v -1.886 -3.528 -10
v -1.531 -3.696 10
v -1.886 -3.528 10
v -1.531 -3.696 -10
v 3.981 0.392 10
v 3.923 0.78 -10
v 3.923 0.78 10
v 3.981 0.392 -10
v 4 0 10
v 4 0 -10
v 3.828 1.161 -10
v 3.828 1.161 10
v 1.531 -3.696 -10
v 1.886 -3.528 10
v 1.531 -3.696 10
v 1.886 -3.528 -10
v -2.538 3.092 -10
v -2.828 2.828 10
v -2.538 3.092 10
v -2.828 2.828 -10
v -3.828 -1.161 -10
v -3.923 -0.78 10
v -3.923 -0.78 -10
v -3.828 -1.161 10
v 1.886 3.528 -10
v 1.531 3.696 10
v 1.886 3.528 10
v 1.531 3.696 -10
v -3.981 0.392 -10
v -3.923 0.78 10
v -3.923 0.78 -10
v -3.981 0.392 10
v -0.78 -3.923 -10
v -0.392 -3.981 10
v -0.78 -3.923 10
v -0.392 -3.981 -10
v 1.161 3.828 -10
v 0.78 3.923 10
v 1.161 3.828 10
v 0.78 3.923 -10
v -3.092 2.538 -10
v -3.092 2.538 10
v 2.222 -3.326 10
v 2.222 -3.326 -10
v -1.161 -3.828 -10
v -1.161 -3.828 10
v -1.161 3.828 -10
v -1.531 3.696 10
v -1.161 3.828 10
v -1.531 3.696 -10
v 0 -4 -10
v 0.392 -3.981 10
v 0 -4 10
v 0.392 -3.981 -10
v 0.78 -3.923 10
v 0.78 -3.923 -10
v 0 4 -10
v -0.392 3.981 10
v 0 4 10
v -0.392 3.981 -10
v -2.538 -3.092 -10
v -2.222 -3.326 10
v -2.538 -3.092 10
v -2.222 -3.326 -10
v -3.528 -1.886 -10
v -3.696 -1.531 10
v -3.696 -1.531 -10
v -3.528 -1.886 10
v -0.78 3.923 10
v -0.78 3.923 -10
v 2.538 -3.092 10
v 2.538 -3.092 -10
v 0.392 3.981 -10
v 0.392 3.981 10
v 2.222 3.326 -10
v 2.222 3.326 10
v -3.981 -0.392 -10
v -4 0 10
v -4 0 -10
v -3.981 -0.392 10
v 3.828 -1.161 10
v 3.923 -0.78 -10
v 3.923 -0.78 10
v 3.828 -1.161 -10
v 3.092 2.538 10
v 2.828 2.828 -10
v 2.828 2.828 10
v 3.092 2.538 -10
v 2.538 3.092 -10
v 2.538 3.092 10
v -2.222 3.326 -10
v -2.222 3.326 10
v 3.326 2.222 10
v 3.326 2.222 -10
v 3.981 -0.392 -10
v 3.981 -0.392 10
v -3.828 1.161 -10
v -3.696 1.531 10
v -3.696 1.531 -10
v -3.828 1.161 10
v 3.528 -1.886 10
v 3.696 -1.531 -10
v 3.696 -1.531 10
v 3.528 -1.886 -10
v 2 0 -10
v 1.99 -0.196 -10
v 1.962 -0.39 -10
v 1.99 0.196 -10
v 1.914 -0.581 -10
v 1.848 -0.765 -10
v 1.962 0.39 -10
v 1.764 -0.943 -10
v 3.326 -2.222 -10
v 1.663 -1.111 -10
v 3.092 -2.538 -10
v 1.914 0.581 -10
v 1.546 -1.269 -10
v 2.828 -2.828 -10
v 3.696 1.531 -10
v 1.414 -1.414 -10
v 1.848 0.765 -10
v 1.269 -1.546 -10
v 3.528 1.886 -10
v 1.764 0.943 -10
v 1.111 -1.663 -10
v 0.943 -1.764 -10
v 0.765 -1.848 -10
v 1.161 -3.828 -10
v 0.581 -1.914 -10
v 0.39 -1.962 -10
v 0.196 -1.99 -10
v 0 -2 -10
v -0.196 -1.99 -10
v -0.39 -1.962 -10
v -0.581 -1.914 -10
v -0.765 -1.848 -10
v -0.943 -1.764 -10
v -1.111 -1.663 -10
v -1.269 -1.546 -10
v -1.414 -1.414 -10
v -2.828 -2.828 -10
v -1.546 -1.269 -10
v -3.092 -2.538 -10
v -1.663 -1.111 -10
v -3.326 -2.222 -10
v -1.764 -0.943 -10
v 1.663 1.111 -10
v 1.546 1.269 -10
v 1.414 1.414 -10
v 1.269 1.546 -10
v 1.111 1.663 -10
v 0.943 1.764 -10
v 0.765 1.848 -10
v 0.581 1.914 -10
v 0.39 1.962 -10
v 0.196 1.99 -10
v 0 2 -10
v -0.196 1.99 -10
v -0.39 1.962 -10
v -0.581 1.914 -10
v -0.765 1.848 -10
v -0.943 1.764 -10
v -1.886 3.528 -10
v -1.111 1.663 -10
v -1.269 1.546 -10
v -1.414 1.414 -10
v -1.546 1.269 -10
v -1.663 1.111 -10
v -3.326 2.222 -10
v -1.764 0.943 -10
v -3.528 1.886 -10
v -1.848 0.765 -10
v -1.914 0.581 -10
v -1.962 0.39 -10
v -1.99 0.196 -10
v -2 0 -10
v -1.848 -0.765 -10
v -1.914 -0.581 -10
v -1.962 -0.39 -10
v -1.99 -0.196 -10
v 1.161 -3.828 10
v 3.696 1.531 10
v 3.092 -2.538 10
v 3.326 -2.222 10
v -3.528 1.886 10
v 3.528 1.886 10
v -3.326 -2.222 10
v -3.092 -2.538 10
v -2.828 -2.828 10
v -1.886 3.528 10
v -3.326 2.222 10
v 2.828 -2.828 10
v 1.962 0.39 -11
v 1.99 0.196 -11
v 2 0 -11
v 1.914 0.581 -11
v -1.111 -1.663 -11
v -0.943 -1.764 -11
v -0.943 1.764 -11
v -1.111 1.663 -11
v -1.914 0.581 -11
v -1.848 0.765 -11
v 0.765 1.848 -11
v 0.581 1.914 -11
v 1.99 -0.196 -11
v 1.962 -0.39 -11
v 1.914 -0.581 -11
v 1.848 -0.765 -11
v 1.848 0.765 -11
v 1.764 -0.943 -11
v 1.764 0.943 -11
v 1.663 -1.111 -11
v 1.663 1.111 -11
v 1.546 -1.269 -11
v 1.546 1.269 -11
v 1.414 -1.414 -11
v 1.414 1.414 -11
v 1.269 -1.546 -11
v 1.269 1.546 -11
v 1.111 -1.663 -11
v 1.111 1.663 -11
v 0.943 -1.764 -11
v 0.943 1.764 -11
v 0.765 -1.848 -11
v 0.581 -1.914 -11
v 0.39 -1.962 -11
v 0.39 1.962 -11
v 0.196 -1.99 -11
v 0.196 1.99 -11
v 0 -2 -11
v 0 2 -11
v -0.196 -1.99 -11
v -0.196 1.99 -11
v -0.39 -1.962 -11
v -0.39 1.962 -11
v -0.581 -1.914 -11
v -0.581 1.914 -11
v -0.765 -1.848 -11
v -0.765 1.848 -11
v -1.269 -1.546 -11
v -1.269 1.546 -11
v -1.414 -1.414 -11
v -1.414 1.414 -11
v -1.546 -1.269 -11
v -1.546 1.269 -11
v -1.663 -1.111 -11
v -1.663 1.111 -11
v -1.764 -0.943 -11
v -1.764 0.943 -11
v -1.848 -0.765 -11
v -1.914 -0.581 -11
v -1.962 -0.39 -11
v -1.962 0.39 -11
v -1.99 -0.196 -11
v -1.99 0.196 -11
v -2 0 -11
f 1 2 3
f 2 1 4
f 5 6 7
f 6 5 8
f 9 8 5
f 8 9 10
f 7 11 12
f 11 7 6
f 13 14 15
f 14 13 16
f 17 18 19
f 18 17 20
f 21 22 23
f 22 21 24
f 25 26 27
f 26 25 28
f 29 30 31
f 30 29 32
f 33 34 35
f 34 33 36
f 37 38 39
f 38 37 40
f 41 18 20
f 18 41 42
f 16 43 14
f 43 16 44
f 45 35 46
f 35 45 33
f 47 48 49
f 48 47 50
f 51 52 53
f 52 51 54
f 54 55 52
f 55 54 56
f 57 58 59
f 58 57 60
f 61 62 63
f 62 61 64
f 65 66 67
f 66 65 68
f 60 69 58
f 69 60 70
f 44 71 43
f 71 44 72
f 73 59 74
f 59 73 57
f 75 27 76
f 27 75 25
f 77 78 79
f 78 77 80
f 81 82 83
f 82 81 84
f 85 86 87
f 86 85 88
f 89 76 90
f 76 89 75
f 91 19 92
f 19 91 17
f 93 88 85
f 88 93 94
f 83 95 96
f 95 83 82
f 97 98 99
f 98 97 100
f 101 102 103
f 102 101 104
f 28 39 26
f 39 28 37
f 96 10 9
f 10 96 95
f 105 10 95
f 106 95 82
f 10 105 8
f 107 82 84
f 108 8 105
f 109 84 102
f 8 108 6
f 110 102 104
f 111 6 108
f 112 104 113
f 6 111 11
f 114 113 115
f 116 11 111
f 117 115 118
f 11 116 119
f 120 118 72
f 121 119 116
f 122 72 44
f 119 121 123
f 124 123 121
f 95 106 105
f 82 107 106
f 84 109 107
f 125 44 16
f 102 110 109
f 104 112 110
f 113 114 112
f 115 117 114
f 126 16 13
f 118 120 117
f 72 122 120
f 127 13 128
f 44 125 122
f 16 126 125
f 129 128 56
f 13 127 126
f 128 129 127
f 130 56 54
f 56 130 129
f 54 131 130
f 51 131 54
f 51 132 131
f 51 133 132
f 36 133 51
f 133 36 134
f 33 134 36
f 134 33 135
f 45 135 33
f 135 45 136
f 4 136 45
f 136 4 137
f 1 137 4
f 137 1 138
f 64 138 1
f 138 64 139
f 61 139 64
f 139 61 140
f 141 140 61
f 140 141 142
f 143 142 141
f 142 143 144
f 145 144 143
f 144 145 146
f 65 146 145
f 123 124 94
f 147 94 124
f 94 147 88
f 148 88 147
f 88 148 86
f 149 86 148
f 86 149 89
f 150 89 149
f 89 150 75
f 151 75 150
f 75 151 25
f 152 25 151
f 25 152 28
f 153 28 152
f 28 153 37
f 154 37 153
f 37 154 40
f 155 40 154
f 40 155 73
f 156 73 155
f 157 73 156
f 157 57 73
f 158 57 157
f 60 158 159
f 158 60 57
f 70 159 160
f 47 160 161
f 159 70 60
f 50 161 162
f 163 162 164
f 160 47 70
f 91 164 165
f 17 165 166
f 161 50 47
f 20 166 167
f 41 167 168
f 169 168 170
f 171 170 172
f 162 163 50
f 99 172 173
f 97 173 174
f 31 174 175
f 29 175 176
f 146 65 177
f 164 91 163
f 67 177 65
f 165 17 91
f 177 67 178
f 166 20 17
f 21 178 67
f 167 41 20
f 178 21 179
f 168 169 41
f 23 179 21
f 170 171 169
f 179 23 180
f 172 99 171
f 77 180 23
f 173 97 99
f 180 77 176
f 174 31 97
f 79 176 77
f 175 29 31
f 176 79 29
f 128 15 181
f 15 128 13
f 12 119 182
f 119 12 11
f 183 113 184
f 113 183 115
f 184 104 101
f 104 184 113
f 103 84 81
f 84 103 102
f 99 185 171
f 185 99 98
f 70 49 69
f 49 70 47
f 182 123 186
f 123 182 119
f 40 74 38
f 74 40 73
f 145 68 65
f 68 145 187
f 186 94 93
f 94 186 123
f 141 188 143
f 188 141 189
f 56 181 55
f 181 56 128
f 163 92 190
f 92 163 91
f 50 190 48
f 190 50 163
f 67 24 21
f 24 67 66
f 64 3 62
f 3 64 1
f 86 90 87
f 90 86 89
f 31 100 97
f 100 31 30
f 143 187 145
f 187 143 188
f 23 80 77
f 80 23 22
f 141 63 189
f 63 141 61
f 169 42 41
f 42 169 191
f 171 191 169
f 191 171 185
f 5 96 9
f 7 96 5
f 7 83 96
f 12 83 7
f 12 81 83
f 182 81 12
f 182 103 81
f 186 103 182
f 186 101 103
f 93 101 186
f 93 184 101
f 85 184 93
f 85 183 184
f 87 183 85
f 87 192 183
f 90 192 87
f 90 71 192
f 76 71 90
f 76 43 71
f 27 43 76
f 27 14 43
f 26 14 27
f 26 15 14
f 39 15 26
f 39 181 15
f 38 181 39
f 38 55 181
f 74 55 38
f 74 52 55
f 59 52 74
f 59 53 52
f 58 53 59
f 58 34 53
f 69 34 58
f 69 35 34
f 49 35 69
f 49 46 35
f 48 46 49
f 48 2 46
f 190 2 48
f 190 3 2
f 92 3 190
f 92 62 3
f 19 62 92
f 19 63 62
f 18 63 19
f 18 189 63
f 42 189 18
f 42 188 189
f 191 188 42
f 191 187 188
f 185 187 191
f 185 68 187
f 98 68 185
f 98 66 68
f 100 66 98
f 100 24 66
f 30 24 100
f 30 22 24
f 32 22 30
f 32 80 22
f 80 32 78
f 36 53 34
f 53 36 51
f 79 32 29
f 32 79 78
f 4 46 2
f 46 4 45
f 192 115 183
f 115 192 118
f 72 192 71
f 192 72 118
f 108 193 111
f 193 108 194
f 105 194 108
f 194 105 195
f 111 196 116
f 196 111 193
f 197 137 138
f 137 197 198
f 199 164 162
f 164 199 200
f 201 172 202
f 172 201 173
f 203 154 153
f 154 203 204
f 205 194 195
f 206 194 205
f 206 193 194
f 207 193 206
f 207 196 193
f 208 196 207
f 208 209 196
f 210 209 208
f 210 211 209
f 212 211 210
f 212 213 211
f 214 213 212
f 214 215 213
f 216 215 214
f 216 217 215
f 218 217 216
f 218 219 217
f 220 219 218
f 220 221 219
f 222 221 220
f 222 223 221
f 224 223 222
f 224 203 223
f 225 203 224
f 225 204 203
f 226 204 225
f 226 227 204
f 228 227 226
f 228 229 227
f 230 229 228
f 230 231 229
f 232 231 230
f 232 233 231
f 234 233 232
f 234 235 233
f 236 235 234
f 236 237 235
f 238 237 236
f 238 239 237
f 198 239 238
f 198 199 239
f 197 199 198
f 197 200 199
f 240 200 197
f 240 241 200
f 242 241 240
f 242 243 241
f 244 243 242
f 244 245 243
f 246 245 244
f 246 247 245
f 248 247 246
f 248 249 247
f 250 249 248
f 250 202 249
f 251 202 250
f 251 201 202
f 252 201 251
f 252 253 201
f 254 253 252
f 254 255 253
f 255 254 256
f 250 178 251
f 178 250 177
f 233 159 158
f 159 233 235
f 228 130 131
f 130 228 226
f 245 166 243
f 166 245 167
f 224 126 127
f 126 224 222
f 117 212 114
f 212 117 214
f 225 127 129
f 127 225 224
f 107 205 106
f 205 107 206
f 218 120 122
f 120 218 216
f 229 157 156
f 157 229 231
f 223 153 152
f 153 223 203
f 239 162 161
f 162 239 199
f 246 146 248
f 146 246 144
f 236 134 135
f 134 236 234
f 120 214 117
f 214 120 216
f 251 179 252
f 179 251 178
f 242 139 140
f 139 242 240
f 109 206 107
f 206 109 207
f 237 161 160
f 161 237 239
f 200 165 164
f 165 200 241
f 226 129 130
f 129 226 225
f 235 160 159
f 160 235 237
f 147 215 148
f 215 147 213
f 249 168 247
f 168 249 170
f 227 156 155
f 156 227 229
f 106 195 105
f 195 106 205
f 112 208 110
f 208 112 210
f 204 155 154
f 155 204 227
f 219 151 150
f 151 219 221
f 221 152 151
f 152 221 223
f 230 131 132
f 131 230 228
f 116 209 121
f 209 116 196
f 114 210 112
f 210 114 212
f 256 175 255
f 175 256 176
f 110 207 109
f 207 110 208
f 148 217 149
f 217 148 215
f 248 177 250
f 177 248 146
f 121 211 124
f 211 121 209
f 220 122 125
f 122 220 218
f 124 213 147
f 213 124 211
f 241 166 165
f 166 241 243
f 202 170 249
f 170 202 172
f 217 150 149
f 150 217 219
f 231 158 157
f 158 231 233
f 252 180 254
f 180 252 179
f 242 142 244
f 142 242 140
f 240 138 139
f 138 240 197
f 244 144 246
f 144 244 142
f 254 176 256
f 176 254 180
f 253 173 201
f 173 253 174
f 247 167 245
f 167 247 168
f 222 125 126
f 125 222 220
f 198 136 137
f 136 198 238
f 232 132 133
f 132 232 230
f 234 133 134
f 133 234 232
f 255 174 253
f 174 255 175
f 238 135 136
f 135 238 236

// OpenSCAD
// Parameters
overall_length_mm = 20; //[10:40:0.5]
outer_diameter_mm = 8; //[4:16:0.5]
thread_diameter_mm = 4; //[2:8:0.1]
thread_pitch_mm = 0.7; //[0.35:1.4:0.05]
threaded_length_mm = 20; //[5:40:0.5]
overlap_mm = 1; //[0.5:2:0.1]

// Standoff - complete geometry
module standoff() {
  color("Silver") {
    // Pillar body
    translate([0, 0, 0])
      cylinder(h=overall_length_mm, r=outer_diameter_mm/2, center=true, $fn=64);
  }
}

// Pillar - complete geometry
module pillar() {
  color("DimGray") {
    // Threaded section
    translate([0, 0, overall_length_mm/2 - threaded_length_mm/2 - overlap_mm])
      cylinder(h=threaded_length_mm, r=thread_diameter_mm/2, center=true, $fn=64);
  }
}

// Assembly
module assembly() {
  union() {
    standoff();
    pillar();
  }
}

assembly();
